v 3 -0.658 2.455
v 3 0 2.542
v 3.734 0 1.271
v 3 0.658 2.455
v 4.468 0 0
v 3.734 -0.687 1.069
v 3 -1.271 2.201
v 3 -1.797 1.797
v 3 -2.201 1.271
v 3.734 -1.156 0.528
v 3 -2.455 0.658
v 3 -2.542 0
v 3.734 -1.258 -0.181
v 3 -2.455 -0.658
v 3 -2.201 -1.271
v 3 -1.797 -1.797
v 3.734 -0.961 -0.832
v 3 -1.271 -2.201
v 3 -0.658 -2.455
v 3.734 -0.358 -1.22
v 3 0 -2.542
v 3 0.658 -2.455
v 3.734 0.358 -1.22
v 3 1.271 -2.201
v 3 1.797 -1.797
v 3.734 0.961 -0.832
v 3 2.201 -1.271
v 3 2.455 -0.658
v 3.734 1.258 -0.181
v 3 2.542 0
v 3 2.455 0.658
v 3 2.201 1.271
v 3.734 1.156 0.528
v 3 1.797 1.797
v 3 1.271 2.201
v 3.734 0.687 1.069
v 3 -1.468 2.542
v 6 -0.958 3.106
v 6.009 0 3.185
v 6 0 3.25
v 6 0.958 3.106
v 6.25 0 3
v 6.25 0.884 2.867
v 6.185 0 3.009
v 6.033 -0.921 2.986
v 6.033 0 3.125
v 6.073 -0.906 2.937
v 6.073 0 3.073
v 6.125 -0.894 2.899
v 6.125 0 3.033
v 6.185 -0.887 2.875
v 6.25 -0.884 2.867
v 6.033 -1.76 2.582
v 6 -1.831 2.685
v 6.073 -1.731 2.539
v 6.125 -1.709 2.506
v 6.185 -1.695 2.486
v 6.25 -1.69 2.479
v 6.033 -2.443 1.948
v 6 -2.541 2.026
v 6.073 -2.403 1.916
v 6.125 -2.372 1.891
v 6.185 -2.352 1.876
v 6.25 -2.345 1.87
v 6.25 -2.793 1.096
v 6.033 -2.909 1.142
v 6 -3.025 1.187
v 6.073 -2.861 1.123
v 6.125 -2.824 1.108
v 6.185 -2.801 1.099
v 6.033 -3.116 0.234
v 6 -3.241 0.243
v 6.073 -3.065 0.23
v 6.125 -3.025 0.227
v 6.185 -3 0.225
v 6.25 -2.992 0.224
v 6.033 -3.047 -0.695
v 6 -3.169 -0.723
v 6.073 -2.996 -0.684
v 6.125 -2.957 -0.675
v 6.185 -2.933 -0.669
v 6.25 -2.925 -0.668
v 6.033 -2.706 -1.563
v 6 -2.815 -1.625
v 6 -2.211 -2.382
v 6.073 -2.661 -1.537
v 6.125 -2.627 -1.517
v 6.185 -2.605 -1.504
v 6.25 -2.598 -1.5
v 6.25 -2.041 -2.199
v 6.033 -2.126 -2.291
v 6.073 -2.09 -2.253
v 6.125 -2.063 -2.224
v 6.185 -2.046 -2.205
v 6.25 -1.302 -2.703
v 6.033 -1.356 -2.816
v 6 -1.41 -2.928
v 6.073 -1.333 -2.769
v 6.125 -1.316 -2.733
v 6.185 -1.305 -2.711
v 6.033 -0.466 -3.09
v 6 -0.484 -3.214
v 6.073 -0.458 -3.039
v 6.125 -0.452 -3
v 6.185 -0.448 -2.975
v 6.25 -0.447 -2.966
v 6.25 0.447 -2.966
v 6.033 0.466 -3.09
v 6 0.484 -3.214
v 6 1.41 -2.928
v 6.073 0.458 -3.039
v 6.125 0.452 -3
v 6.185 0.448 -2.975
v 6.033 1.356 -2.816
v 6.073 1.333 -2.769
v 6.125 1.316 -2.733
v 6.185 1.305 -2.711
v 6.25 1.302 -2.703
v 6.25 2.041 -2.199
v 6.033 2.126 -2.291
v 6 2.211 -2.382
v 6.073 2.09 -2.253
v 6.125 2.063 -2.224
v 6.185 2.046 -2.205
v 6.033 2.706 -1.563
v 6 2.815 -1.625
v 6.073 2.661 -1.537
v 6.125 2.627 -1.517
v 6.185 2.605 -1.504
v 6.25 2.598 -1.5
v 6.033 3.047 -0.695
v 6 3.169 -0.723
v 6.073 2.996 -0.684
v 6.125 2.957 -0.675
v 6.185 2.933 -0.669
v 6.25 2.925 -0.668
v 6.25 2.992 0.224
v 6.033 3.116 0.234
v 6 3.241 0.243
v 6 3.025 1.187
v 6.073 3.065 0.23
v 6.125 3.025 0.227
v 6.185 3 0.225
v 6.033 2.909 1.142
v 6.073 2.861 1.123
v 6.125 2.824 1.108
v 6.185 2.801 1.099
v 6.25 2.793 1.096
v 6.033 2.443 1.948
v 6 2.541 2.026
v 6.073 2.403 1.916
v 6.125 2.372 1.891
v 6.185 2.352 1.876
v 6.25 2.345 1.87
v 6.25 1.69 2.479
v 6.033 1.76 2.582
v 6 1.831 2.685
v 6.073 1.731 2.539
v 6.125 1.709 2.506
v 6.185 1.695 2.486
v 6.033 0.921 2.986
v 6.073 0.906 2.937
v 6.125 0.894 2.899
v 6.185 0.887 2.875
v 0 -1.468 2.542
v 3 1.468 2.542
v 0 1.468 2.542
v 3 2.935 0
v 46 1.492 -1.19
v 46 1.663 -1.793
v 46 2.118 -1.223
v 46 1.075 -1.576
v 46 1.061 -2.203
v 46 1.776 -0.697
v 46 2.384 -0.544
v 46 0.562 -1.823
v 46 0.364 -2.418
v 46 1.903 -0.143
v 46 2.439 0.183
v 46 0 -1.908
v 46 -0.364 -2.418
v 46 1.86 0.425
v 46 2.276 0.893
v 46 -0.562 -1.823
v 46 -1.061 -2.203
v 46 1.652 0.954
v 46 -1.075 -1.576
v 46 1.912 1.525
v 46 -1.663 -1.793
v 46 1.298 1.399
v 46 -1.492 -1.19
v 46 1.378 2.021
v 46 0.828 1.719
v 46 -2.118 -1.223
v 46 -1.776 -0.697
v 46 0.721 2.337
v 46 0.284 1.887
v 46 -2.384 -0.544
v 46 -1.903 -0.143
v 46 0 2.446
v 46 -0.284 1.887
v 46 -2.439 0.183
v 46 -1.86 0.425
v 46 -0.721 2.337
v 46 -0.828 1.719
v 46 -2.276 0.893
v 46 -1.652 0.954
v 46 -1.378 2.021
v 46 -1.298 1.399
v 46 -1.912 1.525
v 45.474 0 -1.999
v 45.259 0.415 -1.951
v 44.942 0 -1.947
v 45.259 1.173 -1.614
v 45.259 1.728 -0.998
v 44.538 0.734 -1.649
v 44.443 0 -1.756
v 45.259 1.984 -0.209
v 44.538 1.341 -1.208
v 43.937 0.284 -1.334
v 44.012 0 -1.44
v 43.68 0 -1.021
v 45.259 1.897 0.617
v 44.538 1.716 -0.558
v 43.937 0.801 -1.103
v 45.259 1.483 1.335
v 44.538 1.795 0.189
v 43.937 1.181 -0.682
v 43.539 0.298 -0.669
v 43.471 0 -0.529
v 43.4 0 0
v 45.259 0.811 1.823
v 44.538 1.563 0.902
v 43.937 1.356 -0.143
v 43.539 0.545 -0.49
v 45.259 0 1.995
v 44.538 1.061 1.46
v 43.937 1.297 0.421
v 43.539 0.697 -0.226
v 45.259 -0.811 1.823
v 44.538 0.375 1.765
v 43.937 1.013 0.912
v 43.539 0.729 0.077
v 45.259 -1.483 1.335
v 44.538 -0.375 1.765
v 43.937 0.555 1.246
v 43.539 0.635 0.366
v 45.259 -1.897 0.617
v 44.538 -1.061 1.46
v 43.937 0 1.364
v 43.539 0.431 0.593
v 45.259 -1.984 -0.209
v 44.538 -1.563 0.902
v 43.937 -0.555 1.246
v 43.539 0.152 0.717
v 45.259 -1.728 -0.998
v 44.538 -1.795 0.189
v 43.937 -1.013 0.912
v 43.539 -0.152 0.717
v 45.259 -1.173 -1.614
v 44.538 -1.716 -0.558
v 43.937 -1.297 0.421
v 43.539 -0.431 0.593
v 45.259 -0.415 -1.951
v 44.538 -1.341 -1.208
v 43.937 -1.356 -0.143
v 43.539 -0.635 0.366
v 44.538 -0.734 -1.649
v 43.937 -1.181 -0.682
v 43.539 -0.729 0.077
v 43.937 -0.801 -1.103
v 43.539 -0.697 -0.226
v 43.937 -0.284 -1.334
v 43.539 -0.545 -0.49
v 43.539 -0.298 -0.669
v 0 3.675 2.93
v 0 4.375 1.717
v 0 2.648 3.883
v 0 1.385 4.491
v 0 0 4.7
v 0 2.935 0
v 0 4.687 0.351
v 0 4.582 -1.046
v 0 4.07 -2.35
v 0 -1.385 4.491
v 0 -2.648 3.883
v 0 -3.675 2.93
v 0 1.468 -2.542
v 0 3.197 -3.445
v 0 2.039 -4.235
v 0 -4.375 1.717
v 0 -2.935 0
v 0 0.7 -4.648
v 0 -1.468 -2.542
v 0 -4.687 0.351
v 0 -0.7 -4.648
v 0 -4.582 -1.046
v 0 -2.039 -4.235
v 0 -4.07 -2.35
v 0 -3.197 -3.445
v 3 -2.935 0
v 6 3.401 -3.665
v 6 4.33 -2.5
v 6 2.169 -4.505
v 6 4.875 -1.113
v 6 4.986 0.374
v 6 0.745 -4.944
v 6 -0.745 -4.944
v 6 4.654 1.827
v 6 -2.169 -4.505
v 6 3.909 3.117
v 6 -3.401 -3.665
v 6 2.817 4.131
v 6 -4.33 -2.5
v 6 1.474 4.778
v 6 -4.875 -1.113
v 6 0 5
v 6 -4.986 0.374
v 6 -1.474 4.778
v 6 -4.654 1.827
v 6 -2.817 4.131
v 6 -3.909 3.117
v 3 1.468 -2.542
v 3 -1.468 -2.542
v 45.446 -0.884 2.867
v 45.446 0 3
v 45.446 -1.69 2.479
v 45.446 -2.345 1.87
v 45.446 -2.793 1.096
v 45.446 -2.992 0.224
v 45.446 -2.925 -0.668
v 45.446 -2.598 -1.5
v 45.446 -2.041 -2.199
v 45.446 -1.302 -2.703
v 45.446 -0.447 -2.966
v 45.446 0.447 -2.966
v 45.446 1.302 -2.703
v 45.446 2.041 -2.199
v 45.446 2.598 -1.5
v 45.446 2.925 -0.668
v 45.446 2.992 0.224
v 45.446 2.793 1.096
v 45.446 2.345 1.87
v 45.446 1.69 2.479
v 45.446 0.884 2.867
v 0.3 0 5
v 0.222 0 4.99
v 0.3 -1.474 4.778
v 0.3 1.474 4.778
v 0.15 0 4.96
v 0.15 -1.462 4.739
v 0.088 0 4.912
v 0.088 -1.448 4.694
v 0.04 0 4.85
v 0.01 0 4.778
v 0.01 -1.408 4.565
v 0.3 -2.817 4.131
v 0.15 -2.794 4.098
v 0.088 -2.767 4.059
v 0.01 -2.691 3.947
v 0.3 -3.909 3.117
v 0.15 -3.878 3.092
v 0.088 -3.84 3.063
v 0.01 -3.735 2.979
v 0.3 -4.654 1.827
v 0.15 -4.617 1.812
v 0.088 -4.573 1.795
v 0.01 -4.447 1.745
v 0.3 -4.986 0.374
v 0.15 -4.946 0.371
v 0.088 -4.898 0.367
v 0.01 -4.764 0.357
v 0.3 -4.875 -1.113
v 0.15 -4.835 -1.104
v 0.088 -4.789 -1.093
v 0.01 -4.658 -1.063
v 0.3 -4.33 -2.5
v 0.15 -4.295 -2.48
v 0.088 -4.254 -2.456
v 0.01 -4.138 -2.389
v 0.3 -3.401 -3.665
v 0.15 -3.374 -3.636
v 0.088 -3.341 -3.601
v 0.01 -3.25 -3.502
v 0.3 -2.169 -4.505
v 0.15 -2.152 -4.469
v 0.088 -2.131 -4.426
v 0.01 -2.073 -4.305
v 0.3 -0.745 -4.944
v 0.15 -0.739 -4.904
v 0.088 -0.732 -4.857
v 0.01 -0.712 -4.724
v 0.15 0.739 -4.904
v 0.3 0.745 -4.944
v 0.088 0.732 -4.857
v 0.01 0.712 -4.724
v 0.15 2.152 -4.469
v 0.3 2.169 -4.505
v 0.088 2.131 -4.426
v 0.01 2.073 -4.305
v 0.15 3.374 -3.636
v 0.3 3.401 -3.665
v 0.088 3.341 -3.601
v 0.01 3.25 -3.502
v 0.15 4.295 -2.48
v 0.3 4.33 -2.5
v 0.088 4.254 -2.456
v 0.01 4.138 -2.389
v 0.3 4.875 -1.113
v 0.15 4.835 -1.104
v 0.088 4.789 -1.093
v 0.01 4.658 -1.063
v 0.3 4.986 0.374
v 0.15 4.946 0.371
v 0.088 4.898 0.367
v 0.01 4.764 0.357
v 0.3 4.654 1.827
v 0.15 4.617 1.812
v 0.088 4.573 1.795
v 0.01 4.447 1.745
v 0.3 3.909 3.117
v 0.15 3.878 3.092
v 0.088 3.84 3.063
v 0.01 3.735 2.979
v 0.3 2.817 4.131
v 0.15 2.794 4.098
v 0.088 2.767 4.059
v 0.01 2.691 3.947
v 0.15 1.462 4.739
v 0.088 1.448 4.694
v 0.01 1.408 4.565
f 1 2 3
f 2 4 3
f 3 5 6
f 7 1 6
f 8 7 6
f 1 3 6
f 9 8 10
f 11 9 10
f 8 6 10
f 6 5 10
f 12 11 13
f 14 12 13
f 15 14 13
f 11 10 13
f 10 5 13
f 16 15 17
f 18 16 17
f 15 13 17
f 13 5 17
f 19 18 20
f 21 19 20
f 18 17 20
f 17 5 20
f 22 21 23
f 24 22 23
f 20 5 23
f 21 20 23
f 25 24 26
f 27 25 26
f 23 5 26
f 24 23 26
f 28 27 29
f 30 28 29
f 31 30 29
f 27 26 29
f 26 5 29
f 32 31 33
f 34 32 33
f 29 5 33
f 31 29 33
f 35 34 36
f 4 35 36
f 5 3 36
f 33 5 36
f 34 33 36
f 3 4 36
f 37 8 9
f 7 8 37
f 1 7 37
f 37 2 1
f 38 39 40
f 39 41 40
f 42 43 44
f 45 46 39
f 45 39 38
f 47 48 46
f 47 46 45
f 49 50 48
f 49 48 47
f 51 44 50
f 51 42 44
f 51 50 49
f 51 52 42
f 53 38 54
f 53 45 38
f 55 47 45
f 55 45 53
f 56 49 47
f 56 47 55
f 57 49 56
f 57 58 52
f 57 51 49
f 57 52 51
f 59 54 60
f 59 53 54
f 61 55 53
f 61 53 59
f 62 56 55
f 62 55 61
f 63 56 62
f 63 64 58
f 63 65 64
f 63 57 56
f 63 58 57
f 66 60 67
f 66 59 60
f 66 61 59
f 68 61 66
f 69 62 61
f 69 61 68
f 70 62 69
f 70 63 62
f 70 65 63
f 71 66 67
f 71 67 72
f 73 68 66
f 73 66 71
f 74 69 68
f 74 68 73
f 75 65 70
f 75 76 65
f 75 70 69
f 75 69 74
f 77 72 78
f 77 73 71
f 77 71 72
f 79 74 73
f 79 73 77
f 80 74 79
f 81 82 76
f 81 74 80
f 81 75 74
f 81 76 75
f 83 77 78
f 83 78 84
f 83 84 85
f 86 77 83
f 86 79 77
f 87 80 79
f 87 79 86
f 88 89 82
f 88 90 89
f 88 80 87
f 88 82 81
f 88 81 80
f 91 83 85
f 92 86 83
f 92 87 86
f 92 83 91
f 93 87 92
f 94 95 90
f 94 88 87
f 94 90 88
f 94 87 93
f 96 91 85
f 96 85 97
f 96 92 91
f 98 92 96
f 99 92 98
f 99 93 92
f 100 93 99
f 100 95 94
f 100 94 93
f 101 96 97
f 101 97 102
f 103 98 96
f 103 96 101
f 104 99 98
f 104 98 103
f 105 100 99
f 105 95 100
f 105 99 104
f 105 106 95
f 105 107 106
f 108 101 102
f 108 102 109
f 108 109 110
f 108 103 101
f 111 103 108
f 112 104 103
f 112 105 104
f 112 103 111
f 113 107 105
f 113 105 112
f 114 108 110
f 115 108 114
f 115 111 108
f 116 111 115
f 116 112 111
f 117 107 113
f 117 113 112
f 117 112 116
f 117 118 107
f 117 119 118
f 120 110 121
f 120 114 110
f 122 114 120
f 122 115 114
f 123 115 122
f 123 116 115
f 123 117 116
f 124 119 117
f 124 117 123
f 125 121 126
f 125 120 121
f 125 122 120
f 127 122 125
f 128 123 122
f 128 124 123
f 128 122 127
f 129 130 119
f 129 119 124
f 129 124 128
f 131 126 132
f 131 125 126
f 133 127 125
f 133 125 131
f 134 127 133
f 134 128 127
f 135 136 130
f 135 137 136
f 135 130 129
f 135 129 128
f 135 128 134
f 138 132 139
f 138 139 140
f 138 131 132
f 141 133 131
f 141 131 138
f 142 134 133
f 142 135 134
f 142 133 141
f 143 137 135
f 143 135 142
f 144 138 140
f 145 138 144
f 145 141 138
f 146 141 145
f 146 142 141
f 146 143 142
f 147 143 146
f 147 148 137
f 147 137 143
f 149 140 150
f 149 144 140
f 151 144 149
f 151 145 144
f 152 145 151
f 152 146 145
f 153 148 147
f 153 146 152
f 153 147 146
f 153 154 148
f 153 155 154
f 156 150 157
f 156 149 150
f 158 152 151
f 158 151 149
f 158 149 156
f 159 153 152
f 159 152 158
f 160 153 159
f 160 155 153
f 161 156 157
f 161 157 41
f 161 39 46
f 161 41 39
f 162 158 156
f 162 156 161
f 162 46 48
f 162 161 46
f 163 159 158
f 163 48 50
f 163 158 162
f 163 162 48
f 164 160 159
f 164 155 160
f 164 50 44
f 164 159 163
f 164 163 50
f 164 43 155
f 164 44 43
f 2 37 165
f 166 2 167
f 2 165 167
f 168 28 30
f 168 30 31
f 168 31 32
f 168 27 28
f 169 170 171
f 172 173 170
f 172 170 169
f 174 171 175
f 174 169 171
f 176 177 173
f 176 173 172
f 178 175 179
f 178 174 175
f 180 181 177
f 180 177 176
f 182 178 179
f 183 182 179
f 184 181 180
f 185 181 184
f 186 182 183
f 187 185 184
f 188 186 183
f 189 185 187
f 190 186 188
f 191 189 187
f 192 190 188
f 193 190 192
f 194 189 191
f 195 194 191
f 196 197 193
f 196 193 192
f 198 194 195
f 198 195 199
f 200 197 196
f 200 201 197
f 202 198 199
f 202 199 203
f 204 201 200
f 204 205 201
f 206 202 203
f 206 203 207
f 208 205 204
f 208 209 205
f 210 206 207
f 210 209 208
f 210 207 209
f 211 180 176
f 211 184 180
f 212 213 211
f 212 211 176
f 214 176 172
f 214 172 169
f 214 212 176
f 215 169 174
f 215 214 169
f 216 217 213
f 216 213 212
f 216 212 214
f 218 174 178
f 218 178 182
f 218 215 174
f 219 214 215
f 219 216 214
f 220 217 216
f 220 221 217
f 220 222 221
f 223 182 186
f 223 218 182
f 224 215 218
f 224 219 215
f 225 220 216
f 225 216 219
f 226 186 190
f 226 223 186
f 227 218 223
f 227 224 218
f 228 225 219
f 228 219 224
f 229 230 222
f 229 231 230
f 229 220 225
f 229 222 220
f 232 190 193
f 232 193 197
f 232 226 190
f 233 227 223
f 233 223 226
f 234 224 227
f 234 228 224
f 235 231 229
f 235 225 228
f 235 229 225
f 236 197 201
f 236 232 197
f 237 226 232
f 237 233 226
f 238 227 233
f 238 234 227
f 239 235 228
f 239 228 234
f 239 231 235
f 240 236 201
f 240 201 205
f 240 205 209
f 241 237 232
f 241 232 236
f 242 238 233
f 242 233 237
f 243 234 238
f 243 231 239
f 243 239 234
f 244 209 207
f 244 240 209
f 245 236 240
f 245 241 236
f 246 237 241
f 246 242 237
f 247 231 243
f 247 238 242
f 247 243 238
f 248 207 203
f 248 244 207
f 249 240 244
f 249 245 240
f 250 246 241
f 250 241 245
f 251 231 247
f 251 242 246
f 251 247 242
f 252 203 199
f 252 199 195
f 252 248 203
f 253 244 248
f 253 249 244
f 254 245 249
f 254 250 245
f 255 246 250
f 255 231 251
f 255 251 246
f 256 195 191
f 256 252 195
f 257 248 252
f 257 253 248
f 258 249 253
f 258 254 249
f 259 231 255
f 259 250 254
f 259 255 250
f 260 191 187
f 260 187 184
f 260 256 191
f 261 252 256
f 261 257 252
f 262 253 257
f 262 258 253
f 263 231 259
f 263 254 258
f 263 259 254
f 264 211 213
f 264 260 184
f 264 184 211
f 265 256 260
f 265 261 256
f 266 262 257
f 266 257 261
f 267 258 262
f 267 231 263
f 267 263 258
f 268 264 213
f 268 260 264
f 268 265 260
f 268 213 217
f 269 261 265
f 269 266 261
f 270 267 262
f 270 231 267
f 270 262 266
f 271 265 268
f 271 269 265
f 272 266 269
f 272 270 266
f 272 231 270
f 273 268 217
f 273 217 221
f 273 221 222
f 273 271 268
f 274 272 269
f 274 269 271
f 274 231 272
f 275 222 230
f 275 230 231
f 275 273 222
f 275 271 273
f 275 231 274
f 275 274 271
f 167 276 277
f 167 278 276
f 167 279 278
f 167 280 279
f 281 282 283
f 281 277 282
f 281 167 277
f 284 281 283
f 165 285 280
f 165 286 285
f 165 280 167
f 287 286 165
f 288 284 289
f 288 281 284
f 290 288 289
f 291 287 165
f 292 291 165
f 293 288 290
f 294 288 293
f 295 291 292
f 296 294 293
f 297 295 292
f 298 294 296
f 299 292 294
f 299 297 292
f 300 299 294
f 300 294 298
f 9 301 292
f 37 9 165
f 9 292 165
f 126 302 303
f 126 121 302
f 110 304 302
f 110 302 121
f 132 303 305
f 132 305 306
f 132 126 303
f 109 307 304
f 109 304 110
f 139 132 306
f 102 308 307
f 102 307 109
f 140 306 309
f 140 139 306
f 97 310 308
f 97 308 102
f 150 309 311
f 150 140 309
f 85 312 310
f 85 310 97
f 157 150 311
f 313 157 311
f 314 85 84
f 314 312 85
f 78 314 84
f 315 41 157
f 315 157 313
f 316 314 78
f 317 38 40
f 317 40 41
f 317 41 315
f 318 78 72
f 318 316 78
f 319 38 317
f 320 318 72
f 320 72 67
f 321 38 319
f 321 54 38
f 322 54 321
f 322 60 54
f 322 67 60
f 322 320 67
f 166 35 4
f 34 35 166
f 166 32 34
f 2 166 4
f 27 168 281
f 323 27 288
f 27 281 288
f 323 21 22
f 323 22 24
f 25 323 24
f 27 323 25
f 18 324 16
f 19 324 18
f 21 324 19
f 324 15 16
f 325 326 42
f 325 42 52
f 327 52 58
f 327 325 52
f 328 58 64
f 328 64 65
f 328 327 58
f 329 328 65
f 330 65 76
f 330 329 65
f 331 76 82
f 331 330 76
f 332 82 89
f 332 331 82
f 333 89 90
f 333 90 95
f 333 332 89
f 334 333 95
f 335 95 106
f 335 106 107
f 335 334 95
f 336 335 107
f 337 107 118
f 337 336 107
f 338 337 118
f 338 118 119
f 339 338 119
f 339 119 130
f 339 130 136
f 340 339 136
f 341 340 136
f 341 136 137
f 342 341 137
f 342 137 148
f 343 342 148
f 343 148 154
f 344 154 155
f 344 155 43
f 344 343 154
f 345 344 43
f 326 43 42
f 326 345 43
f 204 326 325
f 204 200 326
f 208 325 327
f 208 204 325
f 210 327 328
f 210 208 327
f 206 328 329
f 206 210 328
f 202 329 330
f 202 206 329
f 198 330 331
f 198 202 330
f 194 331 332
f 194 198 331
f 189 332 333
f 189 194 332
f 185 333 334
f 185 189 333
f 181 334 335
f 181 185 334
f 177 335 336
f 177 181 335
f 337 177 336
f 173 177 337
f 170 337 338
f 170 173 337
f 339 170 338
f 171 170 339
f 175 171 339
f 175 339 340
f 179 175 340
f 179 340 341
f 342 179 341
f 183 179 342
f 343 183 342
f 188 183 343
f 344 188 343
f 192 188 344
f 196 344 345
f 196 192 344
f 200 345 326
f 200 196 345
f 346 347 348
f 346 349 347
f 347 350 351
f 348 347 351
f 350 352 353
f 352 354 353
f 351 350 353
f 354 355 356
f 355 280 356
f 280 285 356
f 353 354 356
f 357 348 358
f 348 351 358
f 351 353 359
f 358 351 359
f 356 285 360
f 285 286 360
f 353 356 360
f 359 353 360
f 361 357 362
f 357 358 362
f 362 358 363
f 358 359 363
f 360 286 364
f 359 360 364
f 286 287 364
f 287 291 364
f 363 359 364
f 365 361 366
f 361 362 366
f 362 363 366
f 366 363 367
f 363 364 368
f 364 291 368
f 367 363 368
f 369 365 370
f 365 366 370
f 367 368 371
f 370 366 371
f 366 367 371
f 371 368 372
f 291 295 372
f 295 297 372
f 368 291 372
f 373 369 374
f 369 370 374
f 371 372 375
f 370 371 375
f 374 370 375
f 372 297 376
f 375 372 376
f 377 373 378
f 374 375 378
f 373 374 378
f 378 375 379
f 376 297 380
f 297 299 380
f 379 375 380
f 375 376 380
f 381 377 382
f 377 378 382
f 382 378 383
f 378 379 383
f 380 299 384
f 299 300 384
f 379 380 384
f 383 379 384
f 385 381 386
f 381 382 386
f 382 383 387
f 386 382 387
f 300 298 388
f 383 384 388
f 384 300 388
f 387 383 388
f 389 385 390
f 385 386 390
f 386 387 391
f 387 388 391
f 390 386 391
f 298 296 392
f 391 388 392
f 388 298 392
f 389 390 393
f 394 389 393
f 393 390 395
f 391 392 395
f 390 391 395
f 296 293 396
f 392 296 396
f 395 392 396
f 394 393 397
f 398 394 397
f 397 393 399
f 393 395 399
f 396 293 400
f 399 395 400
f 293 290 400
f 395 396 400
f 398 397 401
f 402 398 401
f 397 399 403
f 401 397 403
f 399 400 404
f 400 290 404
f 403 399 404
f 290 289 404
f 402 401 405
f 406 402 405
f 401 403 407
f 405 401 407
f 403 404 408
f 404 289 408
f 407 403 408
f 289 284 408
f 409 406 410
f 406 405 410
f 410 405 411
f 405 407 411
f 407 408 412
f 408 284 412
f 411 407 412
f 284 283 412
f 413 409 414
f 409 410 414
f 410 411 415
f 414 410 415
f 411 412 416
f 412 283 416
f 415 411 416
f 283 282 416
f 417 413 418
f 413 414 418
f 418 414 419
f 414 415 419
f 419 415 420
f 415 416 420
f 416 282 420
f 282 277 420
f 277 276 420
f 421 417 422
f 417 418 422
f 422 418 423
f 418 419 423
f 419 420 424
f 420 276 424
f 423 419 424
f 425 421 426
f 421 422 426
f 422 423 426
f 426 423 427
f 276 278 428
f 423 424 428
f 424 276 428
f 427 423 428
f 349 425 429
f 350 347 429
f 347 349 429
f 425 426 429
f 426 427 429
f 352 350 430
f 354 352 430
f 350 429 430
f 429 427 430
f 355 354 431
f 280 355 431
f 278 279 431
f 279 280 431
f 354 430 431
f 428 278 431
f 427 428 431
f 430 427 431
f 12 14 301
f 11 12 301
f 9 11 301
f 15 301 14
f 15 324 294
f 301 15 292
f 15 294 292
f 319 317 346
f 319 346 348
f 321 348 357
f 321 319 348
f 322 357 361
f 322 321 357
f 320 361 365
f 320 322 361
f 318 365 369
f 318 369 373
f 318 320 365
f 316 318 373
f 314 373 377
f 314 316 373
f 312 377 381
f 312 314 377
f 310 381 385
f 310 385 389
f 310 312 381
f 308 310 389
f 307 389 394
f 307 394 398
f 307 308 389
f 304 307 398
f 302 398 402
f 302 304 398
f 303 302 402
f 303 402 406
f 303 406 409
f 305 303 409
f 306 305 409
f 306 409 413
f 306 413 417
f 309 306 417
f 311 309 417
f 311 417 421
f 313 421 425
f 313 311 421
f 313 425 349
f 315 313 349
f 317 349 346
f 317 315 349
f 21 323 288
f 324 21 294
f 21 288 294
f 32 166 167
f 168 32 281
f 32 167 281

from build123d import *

# Parameters (mm, degrees)
FILLET1_R   = 0.25
FILLET2_R   = 0.3
HEX_2_DEPTH = 3


with BuildPart() as part:
    # BodySke → Base-Revolve (revolve)
    with BuildSketch(Plane.XY, mode=Mode.PRIVATE) as base_revolve_sk:
        Polygon((0, 0), (0, 5), (6, 5), (6, 3), (45.4455, 3), (46, 2.4455), (46, 0), align=None)
    revolve(base_revolve_sk.sketch.rotate(Axis((-31.75, 0, 0), (1, 0, 0)), 90), axis=Axis((-31.75, 0, 0), (1, 0, 0)))

    # Fillet1
    fillet1_edges = [part.edges().sort_by_distance(p)[0] for p in [
        (6, 0, -3),
    ]]
    fillet(fillet1_edges, radius=FILLET1_R)

    # Fillet2
    fillet2_edges = [part.edges().sort_by_distance(p)[0] for p in [
        (0, 0, -5),
    ]]
    fillet(fillet2_edges, radius=FILLET2_R)

    # Sketch2 → Hex-PreBroach (revolve, cut)
    with BuildSketch(Plane.XY, mode=Mode.PRIVATE) as hex_prebroach_sk:
        Polygon((0, 2.542), (3, 2.542), (4.467624384, 0), (0, 0), align=None)
    revolve(hex_prebroach_sk.sketch.rotate(Axis((0, 0, 0), (1, 0, 0)), 90), axis=Axis((0, 0, 0), (1, 0, 0)), mode=Mode.SUBTRACT)

    # Sketch3 → Hex 2 (cut)
    with BuildSketch(Plane(origin=(0, 0, 0), x_dir=(0, 0.500000000000001, 0.866025403784438), z_dir=(-1, 0, 0))):
        Polygon((1.467624384, 2.542), (-1.467624384, 2.542), (-2.935248769, 0), (-1.467624384, -2.542), (1.467624384, -2.542), (2.935248769, 0), align=None)
    extrude(amount=-HEX_2_DEPTH, mode=Mode.SUBTRACT)

    # Esquisse3 → Enlèvement de matière-Révolution1 (revolve, cut)
    with BuildSketch(Plane.XY, mode=Mode.PRIVATE) as enl_vement_de_mati_re_r_volution1_sk:
        with BuildLine():
            Line((43.4, 0), (46, 0))
            Line((46, 0), (46, -1.907878403))
            ThreePointArc((46, -1.907878403), (44.216784043, -1.61245155), (43.4, 0))
        make_face()
    revolve(enl_vement_de_mati_re_r_volution1_sk.sketch.rotate(Axis((43.4, 0, 0), (1, 0, 0)), 90), axis=Axis((43.4, 0, 0), (1, 0, 0)), mode=Mode.SUBTRACT)


solid = part.part
